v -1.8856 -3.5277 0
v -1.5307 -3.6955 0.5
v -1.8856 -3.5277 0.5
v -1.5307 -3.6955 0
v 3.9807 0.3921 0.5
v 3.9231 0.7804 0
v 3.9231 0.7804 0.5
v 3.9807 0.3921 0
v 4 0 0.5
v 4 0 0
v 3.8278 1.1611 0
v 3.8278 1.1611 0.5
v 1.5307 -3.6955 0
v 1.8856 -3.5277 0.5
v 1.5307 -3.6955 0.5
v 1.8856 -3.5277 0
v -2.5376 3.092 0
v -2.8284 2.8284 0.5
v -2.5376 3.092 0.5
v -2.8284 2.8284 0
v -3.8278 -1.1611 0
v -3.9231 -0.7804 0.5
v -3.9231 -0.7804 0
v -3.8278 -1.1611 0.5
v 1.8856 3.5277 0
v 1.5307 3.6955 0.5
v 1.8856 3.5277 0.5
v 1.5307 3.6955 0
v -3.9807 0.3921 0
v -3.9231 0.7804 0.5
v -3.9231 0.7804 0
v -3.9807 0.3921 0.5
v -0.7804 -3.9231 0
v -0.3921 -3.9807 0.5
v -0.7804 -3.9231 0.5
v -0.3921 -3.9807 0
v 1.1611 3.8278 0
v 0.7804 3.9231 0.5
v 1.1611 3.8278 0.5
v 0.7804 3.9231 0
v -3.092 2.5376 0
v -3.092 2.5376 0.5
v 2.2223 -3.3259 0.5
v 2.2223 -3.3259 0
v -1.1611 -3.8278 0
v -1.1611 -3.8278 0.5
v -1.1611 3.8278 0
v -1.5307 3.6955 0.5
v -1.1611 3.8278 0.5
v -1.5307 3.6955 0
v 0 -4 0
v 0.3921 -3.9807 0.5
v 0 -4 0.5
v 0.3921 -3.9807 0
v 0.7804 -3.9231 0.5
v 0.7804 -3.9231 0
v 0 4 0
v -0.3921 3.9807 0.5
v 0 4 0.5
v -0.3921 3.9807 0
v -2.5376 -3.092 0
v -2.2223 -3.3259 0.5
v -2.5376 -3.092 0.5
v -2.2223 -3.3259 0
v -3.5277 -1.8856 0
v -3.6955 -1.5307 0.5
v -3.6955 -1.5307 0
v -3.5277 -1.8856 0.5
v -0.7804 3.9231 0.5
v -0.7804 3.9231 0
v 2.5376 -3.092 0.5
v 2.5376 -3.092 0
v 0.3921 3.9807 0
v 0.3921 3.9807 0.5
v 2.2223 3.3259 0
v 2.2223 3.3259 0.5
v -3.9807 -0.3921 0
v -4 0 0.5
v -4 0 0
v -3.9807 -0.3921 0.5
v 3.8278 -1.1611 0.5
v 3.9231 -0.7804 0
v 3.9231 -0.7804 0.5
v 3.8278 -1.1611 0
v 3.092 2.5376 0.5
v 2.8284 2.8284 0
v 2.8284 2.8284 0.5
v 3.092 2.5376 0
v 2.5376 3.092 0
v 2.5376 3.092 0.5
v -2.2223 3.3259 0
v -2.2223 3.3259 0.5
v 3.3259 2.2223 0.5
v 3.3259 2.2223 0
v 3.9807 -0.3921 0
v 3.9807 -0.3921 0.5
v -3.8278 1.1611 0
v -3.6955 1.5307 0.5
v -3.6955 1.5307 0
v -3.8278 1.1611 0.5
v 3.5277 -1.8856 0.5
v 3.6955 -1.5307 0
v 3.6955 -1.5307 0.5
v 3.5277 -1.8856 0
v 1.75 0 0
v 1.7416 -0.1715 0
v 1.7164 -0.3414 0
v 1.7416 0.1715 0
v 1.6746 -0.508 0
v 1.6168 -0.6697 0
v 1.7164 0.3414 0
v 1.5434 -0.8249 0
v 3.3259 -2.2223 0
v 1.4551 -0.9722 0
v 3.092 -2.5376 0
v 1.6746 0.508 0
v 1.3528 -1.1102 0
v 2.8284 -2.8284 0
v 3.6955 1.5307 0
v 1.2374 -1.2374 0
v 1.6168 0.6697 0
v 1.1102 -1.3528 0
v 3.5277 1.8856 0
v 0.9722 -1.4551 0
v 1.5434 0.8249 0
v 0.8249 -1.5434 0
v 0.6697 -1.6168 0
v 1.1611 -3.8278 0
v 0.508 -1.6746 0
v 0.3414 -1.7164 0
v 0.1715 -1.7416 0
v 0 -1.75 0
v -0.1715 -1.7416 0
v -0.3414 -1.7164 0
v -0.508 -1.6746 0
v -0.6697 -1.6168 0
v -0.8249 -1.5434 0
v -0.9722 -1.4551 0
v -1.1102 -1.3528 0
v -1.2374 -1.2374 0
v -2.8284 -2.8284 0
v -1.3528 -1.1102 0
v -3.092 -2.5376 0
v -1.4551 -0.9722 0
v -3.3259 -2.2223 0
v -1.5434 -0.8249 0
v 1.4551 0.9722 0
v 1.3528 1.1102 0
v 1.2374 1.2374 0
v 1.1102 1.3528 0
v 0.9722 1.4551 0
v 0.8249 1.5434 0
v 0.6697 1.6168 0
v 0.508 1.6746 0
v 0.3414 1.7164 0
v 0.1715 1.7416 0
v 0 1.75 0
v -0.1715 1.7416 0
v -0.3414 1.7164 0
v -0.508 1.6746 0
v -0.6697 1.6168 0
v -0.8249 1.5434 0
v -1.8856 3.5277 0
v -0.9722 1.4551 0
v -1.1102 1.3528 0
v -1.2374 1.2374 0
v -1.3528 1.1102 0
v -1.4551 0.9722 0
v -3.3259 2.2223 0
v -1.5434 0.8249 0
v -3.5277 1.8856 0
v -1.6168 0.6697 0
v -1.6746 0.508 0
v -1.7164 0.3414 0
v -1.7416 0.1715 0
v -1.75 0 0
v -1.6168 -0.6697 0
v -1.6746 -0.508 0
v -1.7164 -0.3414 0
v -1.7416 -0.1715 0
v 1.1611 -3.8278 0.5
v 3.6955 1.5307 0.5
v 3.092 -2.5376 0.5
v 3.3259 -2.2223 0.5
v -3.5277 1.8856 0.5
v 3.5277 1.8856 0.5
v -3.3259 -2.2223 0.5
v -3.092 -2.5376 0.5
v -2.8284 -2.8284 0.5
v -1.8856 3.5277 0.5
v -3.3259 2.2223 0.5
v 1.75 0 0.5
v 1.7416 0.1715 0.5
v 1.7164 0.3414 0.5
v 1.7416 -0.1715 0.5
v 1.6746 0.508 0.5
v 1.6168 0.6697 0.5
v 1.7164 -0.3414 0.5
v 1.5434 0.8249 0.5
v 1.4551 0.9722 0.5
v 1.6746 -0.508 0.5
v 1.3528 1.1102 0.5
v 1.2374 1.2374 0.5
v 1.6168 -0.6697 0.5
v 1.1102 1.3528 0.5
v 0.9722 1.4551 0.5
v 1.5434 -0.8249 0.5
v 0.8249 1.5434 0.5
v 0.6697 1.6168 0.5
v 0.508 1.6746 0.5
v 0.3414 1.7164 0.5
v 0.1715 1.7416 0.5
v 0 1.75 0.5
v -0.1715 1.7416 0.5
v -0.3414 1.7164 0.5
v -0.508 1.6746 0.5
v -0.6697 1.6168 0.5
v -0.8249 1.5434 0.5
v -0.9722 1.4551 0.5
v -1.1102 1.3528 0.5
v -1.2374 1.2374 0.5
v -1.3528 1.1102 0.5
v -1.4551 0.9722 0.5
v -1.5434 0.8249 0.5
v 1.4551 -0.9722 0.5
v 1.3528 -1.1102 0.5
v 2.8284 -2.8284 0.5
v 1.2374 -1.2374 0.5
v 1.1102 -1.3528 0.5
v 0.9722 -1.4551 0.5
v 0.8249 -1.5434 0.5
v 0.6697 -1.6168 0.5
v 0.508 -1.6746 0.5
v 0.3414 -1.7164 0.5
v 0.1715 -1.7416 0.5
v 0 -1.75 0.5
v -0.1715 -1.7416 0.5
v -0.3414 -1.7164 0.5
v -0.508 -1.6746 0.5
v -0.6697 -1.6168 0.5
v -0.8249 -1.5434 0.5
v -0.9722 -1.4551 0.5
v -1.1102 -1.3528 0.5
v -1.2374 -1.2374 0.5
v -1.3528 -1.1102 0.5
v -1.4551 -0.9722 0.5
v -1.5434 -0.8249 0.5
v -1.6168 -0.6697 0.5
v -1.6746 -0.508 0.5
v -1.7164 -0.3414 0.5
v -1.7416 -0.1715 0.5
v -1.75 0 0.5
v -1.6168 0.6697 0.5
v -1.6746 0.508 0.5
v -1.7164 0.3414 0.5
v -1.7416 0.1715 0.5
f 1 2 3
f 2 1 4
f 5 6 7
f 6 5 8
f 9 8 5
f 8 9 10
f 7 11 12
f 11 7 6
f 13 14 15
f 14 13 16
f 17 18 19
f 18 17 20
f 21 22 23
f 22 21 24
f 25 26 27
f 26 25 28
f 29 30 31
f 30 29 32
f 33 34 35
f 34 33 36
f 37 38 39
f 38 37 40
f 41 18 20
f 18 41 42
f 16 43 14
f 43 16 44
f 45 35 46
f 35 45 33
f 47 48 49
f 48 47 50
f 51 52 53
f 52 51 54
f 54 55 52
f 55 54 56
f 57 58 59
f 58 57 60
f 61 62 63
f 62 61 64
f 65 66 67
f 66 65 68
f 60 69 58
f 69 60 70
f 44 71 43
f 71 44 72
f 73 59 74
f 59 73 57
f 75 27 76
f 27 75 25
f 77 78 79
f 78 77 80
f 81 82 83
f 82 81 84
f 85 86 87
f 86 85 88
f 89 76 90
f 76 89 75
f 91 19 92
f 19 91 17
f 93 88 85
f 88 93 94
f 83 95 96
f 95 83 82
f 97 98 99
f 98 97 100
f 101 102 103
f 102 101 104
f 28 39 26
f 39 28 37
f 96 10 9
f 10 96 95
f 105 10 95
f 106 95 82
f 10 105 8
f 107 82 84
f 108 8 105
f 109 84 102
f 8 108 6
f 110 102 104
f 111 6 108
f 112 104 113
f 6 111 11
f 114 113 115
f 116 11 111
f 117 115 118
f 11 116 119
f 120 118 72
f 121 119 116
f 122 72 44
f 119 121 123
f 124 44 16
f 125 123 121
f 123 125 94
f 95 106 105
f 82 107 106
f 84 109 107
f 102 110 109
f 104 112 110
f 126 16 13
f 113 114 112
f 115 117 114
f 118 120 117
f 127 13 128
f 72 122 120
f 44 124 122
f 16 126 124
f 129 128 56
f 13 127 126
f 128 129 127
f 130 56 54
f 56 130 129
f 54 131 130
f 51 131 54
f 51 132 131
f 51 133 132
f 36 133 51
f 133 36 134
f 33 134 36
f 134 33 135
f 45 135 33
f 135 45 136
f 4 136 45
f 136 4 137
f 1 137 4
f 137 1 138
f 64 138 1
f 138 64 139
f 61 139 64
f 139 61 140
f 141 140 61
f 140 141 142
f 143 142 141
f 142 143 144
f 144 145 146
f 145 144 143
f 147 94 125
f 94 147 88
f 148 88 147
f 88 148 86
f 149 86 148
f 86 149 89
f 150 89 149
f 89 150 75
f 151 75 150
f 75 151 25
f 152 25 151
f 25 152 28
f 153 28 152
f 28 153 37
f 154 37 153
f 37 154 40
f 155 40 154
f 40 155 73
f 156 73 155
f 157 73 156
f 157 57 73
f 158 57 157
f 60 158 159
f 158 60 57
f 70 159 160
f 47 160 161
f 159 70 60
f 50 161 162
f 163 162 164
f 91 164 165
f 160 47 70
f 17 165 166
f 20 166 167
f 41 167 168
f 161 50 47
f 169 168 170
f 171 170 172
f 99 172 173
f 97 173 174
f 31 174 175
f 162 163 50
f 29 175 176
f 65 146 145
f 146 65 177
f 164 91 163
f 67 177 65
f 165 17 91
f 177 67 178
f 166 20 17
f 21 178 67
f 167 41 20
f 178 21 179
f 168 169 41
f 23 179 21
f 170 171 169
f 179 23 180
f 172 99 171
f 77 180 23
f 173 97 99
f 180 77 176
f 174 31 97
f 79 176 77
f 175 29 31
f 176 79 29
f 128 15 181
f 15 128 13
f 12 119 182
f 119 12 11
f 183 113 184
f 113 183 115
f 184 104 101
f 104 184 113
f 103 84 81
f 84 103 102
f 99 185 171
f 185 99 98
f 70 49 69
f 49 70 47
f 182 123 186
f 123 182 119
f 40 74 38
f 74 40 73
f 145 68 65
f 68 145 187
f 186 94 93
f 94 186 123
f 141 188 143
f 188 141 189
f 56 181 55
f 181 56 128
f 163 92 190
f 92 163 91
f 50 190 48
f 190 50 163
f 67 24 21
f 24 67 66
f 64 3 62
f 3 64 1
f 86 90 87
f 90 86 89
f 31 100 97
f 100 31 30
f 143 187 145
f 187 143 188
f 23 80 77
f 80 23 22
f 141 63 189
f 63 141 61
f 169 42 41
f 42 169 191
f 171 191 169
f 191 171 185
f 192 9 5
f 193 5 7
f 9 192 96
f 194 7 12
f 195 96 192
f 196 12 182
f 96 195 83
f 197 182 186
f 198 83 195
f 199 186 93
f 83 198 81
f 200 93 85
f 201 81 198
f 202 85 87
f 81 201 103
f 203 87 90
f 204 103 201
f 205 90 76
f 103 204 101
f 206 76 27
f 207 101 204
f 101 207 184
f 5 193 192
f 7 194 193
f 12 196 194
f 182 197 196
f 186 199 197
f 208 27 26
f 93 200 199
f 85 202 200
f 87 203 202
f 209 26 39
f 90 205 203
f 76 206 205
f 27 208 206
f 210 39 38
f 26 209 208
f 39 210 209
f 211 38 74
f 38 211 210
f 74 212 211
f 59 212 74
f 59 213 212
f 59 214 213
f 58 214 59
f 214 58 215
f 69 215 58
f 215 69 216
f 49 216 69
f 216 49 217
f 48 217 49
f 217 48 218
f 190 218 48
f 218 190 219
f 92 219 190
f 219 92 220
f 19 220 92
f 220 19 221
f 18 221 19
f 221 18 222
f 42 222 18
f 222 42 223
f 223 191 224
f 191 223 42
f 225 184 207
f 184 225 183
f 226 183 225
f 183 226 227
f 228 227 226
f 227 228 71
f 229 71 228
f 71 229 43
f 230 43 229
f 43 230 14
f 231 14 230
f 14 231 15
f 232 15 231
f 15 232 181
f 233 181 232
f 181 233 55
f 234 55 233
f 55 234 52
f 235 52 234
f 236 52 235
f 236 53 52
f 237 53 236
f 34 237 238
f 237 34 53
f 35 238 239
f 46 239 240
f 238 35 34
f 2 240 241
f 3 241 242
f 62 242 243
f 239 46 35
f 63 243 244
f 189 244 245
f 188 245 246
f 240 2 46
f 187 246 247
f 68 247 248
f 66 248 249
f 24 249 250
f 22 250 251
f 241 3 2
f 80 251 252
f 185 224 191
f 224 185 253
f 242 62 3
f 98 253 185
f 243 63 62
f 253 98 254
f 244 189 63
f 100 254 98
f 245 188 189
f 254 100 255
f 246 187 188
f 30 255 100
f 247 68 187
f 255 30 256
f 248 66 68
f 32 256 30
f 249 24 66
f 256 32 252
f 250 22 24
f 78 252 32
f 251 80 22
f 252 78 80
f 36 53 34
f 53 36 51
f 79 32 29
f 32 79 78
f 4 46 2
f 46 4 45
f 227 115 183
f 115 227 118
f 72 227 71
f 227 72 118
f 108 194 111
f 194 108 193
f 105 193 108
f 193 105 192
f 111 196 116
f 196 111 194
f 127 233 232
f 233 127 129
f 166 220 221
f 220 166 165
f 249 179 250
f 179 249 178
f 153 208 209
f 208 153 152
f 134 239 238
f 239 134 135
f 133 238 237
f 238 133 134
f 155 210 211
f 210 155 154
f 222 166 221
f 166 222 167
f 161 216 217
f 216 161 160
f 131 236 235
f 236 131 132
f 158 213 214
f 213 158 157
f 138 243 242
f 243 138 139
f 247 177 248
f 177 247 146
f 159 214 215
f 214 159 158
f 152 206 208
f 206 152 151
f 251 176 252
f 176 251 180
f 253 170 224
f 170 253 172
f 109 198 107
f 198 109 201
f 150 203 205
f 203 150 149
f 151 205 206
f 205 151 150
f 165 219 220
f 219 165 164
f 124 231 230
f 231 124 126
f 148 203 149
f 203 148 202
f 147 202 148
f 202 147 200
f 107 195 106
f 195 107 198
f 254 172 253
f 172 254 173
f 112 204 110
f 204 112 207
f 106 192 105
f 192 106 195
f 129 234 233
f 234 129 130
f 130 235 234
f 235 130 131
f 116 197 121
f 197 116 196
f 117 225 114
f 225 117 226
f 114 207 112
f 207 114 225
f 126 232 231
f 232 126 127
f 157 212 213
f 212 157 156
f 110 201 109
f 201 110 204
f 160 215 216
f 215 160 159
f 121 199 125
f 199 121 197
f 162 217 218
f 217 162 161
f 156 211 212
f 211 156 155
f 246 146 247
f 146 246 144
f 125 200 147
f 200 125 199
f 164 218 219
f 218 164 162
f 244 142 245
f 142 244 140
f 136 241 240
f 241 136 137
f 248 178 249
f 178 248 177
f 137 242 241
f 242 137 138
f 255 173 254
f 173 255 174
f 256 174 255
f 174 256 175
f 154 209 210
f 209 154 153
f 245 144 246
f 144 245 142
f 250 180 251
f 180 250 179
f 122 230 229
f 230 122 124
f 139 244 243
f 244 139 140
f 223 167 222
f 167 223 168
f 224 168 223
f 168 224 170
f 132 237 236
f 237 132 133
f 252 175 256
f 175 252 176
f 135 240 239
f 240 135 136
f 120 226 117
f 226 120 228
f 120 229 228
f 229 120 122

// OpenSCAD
difference() {
    cylinder(h=0.5, d=8.0, $fn=64);
    translate([0, 0, -0.1])
        cylinder(h=0.7, d=3.5, $fn=64);
}
